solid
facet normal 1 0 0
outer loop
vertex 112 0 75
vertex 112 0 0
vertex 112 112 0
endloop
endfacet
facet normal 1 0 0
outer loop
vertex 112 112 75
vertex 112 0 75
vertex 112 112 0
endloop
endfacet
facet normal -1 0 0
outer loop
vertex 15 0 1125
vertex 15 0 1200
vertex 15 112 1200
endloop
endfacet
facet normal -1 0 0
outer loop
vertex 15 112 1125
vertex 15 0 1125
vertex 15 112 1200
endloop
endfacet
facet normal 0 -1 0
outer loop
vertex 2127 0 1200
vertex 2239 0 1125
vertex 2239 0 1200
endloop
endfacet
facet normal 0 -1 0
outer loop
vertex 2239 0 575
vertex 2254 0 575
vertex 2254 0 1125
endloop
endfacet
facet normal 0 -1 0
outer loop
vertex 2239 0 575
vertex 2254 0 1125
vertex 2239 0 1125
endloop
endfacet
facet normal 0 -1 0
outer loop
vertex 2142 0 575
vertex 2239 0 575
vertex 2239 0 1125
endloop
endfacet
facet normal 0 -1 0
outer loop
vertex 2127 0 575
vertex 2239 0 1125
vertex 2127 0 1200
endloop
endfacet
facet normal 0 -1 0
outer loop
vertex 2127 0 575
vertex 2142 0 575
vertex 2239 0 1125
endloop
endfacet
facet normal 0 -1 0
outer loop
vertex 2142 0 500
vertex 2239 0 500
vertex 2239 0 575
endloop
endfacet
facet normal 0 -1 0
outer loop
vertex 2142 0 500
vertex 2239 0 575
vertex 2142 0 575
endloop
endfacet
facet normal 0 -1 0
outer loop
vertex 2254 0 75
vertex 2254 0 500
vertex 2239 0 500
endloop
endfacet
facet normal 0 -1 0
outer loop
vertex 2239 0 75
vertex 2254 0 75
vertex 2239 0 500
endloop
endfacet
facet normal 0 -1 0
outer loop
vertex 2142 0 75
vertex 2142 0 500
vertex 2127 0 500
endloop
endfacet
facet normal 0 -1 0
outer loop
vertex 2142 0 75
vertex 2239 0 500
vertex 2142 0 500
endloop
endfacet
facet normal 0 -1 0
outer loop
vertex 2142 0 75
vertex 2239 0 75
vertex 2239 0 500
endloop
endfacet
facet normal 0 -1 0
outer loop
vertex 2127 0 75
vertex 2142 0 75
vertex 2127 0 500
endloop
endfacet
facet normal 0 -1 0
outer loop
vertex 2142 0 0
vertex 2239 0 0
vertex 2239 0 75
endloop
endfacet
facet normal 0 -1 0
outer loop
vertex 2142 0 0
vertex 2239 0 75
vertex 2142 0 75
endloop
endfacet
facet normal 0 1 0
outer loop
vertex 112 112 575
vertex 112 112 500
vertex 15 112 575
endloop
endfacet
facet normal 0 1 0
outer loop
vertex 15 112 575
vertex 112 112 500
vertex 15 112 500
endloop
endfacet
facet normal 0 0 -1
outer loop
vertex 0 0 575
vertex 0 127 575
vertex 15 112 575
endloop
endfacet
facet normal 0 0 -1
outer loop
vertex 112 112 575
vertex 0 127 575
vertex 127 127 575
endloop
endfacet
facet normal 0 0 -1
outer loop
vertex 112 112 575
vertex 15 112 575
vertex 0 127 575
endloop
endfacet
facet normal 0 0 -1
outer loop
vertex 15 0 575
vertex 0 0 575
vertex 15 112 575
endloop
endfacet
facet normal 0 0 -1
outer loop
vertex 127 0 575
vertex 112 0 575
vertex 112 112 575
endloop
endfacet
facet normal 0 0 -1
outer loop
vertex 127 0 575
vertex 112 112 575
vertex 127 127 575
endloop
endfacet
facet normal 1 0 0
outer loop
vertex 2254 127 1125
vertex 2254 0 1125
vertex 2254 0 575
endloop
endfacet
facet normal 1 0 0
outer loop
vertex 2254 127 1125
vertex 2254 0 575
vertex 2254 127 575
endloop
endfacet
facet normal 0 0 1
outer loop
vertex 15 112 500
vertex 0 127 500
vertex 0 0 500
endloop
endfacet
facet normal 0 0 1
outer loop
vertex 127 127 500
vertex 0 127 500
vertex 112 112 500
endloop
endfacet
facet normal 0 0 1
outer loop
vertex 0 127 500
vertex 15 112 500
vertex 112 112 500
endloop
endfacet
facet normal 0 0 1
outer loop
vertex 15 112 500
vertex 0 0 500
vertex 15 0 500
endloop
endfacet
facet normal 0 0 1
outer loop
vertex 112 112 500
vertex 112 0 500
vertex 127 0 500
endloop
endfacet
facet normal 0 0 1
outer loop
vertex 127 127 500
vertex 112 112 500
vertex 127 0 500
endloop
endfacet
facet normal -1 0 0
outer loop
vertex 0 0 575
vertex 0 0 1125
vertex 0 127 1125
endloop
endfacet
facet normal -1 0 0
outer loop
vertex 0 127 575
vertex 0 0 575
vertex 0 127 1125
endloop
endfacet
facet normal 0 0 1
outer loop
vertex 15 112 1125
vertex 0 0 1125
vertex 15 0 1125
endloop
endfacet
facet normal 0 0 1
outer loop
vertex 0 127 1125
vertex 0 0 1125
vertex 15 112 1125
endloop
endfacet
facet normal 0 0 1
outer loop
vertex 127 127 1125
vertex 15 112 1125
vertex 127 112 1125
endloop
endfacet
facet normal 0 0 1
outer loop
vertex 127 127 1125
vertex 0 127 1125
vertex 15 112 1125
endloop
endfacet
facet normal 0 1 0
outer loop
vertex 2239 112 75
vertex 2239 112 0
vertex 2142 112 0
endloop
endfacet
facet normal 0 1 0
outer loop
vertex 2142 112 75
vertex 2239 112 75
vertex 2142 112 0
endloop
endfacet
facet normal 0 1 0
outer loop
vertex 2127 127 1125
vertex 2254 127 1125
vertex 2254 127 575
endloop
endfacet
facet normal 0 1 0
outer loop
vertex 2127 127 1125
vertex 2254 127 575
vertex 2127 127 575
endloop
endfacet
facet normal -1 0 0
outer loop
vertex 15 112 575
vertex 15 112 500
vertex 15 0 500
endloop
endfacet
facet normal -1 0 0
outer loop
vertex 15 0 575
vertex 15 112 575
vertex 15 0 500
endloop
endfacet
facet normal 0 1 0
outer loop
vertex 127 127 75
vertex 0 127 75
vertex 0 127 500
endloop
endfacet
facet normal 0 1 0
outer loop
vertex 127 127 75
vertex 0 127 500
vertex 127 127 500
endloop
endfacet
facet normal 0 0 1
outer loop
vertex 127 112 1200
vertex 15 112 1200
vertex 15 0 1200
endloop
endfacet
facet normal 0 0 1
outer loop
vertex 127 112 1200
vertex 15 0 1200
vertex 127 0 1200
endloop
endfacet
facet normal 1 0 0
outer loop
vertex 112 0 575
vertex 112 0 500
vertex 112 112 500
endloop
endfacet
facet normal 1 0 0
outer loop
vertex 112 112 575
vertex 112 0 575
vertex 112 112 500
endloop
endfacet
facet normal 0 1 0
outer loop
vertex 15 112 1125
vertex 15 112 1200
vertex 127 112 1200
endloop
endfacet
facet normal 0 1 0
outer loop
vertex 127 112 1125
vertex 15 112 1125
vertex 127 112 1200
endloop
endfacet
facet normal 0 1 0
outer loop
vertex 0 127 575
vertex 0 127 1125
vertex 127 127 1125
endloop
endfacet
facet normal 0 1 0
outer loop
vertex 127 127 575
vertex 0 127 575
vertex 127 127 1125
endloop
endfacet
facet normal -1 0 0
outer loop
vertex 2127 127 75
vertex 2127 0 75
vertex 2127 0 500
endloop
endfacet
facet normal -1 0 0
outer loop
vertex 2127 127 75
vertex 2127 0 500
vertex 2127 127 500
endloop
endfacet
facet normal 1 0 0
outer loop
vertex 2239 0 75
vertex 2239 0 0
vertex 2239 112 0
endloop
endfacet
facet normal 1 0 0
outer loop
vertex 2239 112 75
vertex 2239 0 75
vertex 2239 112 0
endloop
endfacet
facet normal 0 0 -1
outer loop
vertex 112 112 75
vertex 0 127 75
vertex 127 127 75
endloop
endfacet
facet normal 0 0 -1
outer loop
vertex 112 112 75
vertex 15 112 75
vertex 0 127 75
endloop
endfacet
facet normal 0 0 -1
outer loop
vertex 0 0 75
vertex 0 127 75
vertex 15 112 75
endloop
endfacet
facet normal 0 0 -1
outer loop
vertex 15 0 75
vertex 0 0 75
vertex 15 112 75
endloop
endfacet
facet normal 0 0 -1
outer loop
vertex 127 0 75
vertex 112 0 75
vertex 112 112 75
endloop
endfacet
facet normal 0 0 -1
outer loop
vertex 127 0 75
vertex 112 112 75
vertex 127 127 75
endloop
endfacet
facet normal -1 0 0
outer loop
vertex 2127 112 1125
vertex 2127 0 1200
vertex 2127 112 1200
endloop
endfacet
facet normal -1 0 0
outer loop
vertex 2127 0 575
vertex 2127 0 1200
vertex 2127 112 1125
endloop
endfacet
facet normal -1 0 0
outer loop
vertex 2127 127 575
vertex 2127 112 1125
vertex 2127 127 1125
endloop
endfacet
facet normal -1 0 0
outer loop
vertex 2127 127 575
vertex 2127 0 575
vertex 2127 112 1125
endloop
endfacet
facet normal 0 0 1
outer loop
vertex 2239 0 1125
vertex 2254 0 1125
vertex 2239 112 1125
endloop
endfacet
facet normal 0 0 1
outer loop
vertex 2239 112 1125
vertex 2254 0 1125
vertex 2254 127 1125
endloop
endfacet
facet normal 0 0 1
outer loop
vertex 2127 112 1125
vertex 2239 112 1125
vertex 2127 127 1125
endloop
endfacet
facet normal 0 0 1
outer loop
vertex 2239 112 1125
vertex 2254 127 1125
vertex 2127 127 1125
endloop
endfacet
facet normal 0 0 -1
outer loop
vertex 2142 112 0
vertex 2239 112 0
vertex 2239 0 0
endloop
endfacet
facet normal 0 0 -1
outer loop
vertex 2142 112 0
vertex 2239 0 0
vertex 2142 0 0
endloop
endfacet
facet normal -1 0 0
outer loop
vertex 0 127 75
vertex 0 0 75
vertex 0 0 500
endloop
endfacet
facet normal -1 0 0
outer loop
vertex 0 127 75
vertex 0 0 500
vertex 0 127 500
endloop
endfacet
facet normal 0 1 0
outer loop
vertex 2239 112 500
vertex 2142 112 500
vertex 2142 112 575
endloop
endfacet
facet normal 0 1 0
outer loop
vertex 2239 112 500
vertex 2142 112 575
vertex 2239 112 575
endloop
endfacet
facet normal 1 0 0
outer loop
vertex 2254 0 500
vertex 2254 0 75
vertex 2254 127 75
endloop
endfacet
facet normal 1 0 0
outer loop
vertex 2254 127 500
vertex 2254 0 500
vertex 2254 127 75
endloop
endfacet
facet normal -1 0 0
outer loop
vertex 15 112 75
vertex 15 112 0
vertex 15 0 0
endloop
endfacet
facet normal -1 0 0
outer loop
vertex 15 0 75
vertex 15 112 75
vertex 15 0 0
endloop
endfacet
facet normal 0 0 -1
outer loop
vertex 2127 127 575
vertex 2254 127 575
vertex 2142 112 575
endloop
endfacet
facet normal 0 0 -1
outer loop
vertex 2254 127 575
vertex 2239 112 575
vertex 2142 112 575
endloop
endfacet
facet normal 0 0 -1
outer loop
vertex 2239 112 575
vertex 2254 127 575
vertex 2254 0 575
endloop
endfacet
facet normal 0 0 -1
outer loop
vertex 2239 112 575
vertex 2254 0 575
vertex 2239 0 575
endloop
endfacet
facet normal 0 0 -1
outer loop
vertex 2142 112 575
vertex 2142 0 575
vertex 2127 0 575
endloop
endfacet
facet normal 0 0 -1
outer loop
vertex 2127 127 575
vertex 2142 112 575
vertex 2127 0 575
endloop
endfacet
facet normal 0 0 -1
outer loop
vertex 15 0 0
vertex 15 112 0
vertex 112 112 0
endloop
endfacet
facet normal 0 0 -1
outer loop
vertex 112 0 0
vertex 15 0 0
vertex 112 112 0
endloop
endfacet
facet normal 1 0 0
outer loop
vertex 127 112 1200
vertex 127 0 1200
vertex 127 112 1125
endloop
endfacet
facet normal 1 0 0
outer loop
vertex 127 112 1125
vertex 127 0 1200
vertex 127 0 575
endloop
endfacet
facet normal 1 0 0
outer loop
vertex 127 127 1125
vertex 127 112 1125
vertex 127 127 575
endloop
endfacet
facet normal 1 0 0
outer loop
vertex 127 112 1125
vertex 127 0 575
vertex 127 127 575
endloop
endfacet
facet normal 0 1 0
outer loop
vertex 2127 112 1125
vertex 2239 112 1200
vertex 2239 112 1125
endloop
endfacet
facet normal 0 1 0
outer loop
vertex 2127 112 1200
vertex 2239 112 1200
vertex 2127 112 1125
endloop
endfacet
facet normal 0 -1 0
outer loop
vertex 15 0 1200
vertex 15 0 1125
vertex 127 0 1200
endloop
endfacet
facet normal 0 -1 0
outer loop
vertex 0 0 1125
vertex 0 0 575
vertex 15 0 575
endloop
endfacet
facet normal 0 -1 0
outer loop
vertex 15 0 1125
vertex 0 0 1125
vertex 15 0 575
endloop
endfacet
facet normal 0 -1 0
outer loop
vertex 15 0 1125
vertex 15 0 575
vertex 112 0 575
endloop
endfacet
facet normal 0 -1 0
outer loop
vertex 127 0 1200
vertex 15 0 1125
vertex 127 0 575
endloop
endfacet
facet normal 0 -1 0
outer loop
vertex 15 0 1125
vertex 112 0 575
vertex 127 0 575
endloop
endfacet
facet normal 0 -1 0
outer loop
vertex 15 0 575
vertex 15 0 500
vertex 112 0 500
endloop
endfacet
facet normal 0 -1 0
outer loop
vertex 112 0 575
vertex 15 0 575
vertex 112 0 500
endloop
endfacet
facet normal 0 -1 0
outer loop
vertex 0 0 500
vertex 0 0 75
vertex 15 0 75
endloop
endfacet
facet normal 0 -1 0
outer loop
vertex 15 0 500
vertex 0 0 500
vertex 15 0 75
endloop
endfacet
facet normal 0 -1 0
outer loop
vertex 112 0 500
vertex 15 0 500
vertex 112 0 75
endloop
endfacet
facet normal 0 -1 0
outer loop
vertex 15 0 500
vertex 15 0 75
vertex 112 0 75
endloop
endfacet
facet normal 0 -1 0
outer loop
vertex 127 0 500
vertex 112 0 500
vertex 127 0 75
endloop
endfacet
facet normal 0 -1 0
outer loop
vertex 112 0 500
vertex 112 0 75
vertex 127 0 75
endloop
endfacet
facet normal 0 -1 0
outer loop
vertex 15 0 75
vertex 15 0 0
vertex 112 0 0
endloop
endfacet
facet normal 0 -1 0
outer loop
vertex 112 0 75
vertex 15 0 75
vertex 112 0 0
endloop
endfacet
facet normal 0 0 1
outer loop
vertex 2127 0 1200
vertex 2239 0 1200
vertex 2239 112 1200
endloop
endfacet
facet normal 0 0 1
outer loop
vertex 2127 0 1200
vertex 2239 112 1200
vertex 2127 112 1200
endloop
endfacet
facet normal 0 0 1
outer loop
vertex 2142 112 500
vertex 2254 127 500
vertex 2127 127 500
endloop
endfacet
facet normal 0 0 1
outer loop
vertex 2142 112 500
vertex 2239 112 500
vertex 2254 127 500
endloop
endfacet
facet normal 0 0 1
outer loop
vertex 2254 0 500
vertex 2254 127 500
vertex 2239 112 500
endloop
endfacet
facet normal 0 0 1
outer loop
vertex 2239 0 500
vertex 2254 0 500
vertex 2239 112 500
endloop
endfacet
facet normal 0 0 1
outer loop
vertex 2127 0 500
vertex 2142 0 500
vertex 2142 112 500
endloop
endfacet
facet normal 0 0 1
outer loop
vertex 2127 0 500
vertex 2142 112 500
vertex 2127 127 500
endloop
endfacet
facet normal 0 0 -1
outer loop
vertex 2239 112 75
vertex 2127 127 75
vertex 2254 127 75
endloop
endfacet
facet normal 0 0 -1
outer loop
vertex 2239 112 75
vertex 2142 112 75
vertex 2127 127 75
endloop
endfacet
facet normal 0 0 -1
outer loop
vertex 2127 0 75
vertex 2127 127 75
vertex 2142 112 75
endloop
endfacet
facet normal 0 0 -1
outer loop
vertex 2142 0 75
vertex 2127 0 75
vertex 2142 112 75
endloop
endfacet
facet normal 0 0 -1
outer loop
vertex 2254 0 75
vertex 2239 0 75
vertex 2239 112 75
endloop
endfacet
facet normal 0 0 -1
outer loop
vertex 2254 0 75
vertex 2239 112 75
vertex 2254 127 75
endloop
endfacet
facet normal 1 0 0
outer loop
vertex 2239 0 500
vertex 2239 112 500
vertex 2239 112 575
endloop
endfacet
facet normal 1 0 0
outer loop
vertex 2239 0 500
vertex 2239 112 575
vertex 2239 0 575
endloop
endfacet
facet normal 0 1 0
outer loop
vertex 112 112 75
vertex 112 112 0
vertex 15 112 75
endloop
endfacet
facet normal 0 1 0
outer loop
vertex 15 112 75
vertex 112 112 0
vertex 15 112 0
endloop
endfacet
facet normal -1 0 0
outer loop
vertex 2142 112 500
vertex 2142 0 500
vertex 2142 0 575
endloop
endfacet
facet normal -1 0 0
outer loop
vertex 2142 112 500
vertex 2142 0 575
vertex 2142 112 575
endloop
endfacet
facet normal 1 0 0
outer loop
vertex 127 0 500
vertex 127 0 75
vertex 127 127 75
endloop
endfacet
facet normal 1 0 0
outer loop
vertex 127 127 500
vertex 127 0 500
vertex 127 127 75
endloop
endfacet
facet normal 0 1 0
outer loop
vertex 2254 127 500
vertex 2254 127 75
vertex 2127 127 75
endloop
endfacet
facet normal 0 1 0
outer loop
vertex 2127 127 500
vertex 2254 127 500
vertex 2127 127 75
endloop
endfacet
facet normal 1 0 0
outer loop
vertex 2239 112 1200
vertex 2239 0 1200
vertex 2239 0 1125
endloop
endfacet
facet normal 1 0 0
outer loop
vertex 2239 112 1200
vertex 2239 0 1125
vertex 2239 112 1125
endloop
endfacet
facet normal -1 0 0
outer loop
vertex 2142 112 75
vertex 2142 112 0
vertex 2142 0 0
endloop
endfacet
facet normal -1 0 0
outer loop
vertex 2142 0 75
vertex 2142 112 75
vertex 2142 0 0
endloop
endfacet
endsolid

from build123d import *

# Parameters (mm, degrees)
F0_W      = 127
F0_H      = 127
F1_DEPTH  = 1200
F3_DEPTH  = 75
F5_START  = -500
F5_DEPTH  = 75
F9_DEPTH  = 75
F11_DEPTH = 75


with BuildPart() as f1:
    # F0 (on Top) → F1 (new body)
    with BuildSketch(Plane.XY):
        with Locations((63.5, 63.5)):
            Rectangle(F0_W, F0_H)
    extrude(amount=F1_DEPTH)

    # F2 (on face) → F3 (cut)
    with BuildSketch(Plane.XY.offset(1200)):
        Polygon((0, 127), (0, 0), (15, 0), (15, 112), (127, 112), (127, 127), align=None)
    extrude(amount=-F3_DEPTH, mode=Mode.SUBTRACT)

    # F4 (on face) → F5 (cut)
    with BuildSketch(Plane(origin=(0, 0, 0), x_dir=(1, 0, 0), z_dir=(0, 0, -1)).offset(F5_START)):
        Polygon((15, 0), (0, 0), (0, -127), (127, -127), (127, 0), (112, 0), (112, -112), (15, -112), align=None)
    extrude(amount=-F5_DEPTH, mode=Mode.SUBTRACT)


with BuildPart() as f7_1:
    # F7: instance of F1
    add(f1.part.mirror(Plane.YZ.offset(1127)))

    # F8 (on face) → F9 (cut)
    with BuildSketch(Plane(origin=(0, 0, 0), x_dir=(1, 0, 0), z_dir=(0, 0, -1))):
        Polygon((2254, -127), (2254, 0), (2239, 0), (2239, -112), (2142, -112), (2142, 0), (2127, 0), (2127, -127), align=None)
    extrude(amount=-F9_DEPTH, mode=Mode.SUBTRACT)


with BuildPart() as f1_1:
    add(f1.part)

    # F10 (on face) → F11 (cut)
    with BuildSketch(Plane(origin=(0, 0, 0), x_dir=(1, 0, 0), z_dir=(0, 0, -1))):
        Polygon((127, -127), (127, 0), (112, 0), (112, -112), (15, -112), (15, 0), (0, 0), (0, -127), align=None)
    extrude(amount=-F11_DEPTH, mode=Mode.SUBTRACT)


solid = Compound([f7_1.part, f1_1.part])
